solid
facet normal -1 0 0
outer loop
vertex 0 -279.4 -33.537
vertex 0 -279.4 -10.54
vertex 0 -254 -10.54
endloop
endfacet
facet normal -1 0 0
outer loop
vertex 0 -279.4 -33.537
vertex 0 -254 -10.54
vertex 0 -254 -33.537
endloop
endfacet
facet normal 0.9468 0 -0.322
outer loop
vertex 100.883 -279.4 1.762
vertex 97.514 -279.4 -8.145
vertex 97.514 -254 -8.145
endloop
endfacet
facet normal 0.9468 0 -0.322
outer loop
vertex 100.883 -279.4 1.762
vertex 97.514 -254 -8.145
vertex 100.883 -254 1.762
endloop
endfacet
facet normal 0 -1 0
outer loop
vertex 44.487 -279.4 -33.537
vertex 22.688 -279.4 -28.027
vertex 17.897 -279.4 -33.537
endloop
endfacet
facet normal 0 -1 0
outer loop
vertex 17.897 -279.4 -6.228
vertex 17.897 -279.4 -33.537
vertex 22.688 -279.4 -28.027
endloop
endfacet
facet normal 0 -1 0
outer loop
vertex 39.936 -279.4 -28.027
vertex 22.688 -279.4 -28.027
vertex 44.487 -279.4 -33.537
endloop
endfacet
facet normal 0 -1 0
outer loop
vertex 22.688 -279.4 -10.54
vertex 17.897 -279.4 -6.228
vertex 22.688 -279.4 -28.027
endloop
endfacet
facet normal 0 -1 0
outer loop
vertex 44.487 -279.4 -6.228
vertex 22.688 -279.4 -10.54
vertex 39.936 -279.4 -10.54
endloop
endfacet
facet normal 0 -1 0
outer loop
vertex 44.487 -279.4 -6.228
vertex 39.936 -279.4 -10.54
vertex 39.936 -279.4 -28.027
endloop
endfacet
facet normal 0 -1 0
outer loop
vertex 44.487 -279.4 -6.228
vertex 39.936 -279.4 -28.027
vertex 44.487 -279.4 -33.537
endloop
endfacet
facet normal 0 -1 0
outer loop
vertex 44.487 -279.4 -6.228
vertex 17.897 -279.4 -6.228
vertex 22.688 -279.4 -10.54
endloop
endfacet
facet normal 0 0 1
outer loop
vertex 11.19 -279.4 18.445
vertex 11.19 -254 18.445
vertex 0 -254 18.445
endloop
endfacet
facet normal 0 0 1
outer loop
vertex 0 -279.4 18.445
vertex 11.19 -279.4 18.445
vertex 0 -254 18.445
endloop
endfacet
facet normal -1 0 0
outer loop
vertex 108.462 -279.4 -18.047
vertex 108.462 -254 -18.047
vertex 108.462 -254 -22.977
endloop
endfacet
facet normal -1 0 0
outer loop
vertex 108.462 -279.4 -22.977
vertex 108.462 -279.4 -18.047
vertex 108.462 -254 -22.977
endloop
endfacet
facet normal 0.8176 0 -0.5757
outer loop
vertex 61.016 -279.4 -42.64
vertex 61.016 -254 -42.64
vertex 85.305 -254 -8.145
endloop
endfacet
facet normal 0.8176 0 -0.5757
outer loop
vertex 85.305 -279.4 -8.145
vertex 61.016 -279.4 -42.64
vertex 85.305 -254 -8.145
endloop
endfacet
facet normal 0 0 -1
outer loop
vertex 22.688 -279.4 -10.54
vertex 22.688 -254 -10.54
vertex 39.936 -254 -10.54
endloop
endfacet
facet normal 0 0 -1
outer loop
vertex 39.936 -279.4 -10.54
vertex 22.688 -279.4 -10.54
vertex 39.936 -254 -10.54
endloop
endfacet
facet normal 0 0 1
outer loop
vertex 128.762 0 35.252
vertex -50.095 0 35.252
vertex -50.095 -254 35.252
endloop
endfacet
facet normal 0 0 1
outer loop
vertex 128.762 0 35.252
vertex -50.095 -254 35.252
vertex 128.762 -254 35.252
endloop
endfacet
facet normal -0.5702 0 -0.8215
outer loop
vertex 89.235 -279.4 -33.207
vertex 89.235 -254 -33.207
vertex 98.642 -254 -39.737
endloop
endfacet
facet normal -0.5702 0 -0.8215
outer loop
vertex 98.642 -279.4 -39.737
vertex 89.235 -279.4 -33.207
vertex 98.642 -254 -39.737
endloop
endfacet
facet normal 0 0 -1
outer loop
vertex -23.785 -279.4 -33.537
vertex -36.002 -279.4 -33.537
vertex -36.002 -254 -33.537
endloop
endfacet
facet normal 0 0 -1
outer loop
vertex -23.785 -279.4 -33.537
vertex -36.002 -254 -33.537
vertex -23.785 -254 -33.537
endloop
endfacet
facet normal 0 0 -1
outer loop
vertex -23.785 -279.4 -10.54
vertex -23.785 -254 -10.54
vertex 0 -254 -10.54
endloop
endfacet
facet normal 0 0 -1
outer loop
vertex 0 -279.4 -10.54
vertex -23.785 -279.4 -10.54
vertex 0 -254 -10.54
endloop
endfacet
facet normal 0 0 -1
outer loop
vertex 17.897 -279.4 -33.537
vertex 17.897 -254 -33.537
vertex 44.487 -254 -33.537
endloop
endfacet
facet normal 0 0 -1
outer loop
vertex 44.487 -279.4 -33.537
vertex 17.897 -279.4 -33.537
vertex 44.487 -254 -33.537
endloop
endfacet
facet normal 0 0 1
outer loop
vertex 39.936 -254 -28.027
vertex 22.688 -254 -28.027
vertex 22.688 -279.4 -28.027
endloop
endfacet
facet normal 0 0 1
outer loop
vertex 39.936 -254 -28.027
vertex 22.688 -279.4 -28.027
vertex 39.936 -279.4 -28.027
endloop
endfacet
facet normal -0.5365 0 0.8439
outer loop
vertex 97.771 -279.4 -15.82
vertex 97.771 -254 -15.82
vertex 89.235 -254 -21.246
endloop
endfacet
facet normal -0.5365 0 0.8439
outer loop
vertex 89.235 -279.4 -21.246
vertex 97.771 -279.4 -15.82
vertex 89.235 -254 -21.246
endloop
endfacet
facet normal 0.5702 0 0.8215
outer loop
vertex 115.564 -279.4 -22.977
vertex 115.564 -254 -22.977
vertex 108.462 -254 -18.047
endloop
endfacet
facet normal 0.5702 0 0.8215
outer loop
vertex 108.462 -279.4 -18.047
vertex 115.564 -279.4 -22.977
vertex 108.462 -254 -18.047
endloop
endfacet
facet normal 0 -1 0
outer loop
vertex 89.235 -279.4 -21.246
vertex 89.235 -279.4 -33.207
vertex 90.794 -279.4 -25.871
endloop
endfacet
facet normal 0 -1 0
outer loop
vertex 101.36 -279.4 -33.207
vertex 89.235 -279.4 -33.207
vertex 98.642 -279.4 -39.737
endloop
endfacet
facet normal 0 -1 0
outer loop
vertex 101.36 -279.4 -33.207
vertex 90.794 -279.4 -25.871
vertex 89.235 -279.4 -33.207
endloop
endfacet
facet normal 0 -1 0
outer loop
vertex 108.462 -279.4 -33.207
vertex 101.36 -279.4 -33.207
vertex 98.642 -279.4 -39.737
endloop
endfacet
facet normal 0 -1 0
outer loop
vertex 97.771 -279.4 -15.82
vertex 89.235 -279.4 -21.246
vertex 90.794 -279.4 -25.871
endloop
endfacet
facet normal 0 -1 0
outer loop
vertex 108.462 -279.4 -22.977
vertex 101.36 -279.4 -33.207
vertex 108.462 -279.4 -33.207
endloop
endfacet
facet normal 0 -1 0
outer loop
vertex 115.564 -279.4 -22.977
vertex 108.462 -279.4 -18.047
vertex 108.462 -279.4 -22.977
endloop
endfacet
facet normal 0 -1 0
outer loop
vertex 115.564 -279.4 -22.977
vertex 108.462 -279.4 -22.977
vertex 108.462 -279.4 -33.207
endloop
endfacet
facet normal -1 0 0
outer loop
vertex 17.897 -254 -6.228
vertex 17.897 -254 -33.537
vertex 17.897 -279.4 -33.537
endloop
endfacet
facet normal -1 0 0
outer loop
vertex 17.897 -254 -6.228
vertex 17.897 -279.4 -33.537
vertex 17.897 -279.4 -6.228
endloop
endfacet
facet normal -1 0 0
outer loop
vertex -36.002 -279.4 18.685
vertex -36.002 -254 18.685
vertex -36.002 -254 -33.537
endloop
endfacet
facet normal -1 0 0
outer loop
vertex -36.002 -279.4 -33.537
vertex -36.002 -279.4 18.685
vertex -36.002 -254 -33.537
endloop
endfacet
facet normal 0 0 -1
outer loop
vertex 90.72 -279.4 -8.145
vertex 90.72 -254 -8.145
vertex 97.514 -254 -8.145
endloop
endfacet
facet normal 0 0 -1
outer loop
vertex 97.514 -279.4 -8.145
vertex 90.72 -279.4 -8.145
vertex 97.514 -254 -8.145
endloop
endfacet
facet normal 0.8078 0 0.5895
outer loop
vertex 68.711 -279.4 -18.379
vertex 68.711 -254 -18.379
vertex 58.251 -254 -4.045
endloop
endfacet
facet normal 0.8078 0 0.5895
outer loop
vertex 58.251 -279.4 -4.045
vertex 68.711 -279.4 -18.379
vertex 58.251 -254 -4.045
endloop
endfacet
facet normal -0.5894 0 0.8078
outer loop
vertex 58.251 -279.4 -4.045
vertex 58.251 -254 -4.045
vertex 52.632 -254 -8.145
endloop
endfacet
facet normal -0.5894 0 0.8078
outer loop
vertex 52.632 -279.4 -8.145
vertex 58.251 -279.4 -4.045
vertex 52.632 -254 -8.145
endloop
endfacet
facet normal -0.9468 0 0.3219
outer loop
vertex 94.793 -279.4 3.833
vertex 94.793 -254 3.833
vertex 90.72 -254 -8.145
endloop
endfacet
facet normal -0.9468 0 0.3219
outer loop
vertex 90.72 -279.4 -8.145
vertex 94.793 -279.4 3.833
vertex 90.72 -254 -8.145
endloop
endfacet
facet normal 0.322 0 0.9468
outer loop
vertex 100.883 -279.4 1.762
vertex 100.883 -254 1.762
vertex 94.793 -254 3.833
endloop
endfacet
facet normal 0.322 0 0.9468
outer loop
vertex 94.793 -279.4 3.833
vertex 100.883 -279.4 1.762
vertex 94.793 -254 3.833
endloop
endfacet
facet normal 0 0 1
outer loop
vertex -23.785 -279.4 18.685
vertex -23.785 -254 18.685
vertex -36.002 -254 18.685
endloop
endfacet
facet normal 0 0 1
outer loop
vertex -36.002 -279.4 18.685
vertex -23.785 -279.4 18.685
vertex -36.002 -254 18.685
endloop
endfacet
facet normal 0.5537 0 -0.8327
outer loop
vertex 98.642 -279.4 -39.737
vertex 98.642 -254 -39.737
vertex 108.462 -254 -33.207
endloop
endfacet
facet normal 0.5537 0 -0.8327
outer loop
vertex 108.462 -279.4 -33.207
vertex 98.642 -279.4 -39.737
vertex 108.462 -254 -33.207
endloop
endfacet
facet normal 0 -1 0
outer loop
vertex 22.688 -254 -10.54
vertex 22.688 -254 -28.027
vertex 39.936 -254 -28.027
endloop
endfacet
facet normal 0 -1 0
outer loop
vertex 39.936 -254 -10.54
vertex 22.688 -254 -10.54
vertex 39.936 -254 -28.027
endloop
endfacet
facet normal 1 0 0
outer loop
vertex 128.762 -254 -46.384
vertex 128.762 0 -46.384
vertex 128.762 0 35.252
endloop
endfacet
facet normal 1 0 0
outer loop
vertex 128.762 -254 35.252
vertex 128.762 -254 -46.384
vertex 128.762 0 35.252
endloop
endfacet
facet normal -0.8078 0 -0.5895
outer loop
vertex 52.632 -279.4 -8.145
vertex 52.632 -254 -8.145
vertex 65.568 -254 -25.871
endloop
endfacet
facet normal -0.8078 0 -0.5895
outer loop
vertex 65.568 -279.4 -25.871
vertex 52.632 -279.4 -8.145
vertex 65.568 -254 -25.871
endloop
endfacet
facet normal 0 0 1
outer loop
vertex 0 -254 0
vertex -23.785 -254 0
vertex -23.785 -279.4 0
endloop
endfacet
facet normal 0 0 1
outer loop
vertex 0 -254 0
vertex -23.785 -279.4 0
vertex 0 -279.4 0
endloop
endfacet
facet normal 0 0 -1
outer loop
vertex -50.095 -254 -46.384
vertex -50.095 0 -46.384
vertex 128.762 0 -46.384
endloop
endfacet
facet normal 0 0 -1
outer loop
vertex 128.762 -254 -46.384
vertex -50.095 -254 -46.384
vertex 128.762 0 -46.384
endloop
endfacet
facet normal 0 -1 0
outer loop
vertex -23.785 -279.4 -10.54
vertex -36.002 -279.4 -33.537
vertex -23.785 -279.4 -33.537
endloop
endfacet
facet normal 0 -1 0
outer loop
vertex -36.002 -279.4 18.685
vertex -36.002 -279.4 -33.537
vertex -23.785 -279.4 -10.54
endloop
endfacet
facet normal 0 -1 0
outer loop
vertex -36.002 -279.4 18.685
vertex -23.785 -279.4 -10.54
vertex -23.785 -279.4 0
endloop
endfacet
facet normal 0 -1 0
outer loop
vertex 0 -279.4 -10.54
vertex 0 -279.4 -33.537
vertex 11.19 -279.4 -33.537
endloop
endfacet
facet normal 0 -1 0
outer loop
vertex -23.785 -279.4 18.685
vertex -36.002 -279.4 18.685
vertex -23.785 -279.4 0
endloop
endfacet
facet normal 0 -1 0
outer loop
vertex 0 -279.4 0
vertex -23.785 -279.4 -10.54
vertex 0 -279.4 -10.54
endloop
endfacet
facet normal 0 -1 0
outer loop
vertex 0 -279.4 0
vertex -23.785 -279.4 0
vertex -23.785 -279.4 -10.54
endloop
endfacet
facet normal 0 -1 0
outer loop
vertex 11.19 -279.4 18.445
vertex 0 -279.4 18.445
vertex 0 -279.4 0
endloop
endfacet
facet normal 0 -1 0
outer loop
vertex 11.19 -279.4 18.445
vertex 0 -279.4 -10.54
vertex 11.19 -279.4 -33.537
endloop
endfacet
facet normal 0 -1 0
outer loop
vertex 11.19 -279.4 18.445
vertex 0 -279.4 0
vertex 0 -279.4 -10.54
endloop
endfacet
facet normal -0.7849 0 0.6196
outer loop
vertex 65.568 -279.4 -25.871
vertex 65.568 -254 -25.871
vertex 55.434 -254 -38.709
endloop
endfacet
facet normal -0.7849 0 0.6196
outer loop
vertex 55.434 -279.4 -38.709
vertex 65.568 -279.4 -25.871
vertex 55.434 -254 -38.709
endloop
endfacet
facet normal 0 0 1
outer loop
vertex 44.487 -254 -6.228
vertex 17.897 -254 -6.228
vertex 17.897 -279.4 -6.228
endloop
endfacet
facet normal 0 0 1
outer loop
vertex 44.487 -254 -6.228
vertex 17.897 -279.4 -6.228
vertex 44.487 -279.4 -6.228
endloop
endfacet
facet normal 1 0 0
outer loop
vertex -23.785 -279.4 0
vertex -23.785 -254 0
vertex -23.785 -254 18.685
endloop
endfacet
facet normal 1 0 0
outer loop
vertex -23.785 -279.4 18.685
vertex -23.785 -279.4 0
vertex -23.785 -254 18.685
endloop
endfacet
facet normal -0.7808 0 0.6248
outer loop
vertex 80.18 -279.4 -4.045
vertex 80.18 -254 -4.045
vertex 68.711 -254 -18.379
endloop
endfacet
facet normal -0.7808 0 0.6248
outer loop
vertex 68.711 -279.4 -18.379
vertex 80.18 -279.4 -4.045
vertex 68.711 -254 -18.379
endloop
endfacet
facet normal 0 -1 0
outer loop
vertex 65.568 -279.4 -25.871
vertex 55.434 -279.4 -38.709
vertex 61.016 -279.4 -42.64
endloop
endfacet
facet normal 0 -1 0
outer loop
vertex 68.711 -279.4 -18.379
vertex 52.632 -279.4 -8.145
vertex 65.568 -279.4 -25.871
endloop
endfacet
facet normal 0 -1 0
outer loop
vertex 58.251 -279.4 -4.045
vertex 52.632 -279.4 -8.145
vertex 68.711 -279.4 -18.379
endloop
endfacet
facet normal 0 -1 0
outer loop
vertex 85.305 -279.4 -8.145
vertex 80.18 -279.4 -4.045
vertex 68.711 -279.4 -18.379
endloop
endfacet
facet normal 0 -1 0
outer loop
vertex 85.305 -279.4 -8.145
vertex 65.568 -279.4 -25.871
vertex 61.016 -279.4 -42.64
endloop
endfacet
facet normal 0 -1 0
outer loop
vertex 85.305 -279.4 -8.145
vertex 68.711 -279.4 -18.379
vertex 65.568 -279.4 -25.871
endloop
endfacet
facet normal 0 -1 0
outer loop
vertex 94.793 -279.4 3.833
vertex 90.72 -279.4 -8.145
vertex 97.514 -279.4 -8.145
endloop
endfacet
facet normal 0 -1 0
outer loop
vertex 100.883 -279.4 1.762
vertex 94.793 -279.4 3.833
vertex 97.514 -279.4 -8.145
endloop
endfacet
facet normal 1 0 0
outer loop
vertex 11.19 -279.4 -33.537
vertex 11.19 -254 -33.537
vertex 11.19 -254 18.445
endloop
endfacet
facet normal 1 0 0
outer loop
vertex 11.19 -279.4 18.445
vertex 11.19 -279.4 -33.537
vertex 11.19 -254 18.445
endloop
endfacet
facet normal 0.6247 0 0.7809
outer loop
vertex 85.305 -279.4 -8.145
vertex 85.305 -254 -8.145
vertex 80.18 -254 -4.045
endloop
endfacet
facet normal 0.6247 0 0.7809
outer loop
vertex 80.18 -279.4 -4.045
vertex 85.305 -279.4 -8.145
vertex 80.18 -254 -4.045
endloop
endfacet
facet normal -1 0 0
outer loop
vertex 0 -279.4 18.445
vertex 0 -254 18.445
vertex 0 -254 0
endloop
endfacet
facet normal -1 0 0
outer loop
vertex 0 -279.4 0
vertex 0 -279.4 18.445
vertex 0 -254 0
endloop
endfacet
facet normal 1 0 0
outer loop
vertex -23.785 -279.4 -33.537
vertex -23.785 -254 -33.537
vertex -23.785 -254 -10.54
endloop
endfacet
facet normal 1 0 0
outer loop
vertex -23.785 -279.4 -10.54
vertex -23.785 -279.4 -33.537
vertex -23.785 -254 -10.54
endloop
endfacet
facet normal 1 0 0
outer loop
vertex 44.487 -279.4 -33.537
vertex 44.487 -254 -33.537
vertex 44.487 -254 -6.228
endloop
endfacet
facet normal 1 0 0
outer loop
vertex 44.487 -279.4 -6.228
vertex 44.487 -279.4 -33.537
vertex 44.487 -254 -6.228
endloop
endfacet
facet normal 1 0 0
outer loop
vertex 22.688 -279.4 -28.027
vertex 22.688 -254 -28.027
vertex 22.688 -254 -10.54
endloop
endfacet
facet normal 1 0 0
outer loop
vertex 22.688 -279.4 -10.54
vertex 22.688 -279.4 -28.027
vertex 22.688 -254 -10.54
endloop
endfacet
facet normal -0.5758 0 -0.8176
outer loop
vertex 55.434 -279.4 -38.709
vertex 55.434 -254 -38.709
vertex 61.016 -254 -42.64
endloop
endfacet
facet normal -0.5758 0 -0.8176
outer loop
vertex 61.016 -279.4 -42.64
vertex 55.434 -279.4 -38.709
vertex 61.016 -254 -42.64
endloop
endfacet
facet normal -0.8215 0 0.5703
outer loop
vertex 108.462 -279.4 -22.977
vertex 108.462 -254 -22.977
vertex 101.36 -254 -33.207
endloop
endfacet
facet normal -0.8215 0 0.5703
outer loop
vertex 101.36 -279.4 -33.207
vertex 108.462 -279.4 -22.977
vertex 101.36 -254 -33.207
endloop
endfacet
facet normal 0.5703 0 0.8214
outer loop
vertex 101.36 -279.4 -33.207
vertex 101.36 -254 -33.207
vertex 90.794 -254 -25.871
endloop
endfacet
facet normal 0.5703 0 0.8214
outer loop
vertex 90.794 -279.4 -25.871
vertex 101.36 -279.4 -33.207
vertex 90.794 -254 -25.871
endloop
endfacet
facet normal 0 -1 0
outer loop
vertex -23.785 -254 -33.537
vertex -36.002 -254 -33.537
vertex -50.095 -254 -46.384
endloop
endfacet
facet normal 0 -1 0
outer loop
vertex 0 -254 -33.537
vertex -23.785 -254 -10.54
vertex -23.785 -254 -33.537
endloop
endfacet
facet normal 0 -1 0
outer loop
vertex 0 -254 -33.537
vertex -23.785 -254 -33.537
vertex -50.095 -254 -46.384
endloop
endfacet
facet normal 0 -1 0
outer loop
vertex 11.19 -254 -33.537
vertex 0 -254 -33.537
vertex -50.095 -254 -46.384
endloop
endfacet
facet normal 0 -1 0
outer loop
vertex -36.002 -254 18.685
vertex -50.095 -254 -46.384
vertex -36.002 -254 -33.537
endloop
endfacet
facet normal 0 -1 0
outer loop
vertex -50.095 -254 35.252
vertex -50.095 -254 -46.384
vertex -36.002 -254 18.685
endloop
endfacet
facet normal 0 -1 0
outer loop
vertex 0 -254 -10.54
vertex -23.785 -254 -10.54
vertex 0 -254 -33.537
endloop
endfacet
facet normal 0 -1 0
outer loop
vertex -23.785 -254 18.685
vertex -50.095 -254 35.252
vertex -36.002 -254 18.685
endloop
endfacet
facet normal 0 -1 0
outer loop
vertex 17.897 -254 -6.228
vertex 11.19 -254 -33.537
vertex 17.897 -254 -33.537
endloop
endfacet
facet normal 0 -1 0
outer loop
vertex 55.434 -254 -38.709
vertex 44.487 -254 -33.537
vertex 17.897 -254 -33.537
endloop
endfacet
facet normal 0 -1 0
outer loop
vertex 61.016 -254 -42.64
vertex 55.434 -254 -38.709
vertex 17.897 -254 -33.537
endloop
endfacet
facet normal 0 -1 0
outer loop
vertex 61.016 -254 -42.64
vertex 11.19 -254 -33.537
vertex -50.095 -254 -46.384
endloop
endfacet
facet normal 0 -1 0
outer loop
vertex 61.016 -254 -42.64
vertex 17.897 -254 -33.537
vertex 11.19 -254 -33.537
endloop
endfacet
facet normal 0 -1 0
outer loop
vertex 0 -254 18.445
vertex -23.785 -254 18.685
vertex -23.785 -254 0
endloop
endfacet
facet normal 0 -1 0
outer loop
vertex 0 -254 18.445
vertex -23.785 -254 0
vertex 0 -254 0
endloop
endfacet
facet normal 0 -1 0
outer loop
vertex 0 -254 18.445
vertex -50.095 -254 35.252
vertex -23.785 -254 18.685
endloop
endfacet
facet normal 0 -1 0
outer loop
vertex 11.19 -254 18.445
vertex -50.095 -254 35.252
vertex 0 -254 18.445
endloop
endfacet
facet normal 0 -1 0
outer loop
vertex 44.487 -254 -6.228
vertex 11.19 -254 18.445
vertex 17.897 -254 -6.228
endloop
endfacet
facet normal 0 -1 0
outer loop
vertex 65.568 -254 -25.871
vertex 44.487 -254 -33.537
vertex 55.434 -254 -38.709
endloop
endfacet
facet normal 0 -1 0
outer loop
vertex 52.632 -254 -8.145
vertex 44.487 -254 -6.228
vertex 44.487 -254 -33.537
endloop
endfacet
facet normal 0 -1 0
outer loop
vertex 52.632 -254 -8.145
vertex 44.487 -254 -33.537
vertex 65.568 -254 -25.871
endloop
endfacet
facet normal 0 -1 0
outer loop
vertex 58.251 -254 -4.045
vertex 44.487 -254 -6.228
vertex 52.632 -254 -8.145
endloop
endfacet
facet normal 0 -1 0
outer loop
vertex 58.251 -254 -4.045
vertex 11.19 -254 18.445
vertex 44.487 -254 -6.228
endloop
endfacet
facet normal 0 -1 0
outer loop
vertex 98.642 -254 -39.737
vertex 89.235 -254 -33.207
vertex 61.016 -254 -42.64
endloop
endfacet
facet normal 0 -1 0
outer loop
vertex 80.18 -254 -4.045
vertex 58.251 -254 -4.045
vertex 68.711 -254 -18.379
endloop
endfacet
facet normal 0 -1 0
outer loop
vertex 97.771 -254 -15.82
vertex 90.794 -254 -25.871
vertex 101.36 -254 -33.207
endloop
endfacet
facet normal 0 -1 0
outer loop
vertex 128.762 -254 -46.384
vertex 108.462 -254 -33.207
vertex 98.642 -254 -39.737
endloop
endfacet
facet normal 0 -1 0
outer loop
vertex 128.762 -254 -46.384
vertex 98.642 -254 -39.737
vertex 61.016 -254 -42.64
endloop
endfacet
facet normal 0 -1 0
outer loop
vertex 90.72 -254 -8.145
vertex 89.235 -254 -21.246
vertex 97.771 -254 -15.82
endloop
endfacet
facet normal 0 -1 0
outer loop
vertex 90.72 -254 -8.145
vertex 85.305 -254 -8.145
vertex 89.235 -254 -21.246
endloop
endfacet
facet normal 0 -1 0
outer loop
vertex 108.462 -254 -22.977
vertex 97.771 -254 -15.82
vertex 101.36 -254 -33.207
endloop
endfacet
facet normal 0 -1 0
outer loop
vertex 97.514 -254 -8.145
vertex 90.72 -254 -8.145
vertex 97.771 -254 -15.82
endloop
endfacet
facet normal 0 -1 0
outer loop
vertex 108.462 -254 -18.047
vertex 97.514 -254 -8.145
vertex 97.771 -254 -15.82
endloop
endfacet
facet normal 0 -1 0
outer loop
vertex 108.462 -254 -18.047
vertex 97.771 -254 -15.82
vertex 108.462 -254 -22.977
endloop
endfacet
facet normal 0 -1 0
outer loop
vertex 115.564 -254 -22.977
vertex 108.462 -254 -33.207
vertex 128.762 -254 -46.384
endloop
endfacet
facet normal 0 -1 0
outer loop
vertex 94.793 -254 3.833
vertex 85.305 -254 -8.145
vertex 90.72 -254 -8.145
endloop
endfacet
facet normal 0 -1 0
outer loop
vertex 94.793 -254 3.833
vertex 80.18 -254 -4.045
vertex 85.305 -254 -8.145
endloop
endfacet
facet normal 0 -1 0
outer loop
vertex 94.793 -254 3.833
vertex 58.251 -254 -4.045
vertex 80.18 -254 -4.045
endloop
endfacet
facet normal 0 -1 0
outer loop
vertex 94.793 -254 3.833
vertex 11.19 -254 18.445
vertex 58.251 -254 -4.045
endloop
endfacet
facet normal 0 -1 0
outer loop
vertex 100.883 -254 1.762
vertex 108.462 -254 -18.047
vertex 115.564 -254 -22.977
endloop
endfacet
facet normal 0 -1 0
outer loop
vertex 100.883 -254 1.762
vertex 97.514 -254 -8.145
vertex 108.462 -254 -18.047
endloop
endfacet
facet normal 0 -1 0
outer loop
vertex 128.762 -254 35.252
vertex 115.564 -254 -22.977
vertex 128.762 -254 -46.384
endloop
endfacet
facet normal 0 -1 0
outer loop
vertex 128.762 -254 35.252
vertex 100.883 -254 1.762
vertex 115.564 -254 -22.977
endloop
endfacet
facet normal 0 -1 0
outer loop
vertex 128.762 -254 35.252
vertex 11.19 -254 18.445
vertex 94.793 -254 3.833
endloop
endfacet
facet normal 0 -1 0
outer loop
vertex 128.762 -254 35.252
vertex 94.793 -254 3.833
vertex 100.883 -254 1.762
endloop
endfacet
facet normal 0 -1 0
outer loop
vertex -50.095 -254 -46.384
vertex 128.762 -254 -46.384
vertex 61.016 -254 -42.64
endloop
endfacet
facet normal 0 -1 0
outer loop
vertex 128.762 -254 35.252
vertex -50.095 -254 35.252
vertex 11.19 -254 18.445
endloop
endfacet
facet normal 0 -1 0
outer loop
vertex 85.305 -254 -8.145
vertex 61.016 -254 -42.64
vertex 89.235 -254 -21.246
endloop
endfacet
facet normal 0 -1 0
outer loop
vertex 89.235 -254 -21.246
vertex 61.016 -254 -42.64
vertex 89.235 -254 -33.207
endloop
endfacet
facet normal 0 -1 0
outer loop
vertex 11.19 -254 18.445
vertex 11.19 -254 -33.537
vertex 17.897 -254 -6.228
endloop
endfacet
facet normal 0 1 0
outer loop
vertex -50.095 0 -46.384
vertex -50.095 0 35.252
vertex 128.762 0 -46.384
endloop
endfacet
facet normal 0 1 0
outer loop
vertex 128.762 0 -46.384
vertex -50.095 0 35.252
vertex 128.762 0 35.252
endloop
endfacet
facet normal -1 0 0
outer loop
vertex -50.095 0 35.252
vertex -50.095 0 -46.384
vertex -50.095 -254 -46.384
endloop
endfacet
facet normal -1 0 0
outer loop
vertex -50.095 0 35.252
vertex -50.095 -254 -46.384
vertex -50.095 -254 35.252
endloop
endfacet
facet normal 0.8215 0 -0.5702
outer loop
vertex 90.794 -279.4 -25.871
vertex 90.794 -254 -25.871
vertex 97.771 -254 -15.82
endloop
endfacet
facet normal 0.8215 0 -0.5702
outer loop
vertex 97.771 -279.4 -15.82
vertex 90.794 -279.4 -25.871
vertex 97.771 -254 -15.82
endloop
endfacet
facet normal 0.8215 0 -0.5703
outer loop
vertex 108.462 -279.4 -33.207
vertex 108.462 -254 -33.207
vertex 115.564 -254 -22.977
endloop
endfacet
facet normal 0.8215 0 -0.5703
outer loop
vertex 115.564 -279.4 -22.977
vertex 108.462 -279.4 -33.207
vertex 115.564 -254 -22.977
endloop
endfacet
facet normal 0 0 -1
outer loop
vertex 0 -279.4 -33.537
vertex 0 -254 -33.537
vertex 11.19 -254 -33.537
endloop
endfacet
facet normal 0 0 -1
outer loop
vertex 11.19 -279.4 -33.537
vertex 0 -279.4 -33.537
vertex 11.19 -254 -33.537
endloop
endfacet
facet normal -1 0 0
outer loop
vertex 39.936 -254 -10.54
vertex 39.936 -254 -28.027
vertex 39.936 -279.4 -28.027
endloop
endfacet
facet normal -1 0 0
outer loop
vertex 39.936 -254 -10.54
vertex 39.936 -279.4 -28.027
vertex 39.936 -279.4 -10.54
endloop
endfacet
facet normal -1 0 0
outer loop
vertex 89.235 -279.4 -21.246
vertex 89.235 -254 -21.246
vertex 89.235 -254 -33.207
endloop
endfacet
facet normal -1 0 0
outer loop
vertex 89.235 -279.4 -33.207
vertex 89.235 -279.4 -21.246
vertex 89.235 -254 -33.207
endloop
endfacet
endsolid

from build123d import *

# Parameters (mm, degrees)
F0_W     = 178.8574159145
F0_H     = 81.6361643374
F1_DEPTH = 254
F2_W     = 23.7848889083
F2_H     = 10.5402404442
F2_W_2   = 26.5901517123
F2_H_2   = 27.3088035174
F2_W_3   = 17.2476675361
F2_H_3   = 17.4872139469
F3_DEPTH = 279.4


with BuildPart() as f1:
    # F0 (on Front) → F1 (new body)
    with BuildSketch(Plane.XZ):
        with Locations((39.3337905407, -5.5660996586)):
            Rectangle(F0_W, F0_H)
    extrude(amount=F1_DEPTH)

    # F2 (on Front) → F3 (join)
    with BuildSketch(Plane.XZ):
        Polygon((-23.7848889083, 18.684970215), (-36.00198403, 18.684970215), (-36.00198403, -33.5371270776), (-23.7848889083, -33.5371270776), (-23.7848889083, -10.5402404442), (-23.7848889083, 0), align=None)
        with Locations((-11.8924444541, -5.2701202221)):
            Rectangle(F2_W, F2_H)
        Polygon((0, 18.4454191476), (0, 0), (0, -10.5402404442), (0, -33.5371270776), (11.1895417795, -33.5371270776), (11.1895417795, 18.4454191476), align=None)
        with Locations((31.1920428649, -19.8827253189)):
            Rectangle(F2_W_2, F2_H_2)
        with Locations((31.3118183985, -19.2838474177)):
            Rectangle(F2_W_3, F2_H_3, mode=Mode.SUBTRACT)
        Polygon((58.2506749504, -4.0445046551), (52.6318475604, -8.144730702), (65.5675977468, -25.8714966476), (55.4336216789, -38.7093556306), (61.0161311924, -42.6400601864), (85.3046610062, -8.144730702), (80.1802054048, -4.0445046551), (68.7108764795, -18.3788526116), align=None)
        Polygon((100.8825037981, 1.7623157246), (94.7928056121, 3.8328145165), (90.7204374671, -8.144730702), (97.5141057214, -8.144730702), align=None)
        Polygon((97.7708830958, -15.8204832481), (89.2352089286, -21.2462227792), (89.2352089286, -33.206935972), (98.6418065629, -39.7368925247), (108.4621548653, -33.206935972), (115.5638098717, -22.9767896235), (108.4621548653, -18.0468988759), (108.4621548653, -22.9767896235), (101.3604998589, -33.206935972), (90.7935802111, -25.8714966476), align=None)
    extrude(amount=F3_DEPTH)


solid = f1.part
